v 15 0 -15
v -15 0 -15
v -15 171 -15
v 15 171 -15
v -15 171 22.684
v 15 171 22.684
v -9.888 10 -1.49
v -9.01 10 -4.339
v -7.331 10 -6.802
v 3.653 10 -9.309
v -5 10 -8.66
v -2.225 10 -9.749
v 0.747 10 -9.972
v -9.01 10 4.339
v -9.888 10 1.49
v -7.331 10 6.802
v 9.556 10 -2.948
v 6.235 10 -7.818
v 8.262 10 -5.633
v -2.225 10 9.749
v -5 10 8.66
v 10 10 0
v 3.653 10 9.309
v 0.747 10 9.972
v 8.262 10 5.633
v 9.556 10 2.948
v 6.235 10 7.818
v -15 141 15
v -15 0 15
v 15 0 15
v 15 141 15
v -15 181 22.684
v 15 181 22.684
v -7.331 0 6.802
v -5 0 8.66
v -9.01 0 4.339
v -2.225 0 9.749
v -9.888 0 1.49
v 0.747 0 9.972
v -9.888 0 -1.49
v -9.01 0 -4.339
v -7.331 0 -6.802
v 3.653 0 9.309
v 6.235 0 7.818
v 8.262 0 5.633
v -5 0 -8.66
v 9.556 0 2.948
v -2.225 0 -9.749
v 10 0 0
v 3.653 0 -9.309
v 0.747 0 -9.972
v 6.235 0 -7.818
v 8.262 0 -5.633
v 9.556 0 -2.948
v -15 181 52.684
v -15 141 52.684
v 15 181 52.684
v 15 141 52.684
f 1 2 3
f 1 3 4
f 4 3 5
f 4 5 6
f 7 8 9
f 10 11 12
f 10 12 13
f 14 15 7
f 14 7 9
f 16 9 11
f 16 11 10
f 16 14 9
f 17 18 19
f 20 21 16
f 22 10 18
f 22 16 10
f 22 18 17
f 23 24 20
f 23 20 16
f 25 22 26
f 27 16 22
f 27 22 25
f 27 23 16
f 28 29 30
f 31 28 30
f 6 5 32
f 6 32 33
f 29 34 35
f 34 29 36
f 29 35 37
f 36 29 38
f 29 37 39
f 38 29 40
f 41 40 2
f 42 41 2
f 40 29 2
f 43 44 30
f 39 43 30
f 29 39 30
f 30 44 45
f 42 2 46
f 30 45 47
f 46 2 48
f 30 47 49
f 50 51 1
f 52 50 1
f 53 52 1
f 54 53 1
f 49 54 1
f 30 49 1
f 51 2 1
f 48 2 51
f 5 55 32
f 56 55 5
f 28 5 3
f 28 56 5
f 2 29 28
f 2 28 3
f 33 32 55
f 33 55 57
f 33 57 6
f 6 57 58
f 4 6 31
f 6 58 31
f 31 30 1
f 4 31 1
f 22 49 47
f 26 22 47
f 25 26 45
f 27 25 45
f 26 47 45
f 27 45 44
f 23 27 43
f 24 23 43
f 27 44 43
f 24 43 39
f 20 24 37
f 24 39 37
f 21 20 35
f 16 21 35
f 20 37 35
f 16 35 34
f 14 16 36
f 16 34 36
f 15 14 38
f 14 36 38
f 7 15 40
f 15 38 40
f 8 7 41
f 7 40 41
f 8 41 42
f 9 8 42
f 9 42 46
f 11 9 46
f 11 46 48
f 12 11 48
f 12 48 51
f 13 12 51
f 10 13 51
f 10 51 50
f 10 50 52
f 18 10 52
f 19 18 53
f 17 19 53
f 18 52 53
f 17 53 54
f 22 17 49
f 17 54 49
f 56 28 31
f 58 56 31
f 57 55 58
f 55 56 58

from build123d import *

# Parameters (mm, degrees)
SKETCH1_W           = 30
SKETCH1_H           = 30
BOSS_EXTRUDE1_DEPTH = 171
SKETCH2_R           = 10
CUT_EXTRUDE1_DEPTH  = 10
SKETCH3_W           = 30
SKETCH3_H           = 30
BOSS_EXTRUDE2_DEPTH = 37.6839
SKETCH5_W           = 30
SKETCH5_H           = 30
BOSS_EXTRUDE3_DEPTH = 10


with BuildPart() as part:
    # Sketch1 → Boss-Extrude1 (new body)
    with BuildSketch(Plane(origin=(0, 0, 0), x_dir=(1, 0, 0), z_dir=(0, 1, 0))):
        Rectangle(SKETCH1_W, SKETCH1_H)
    extrude(amount=BOSS_EXTRUDE1_DEPTH)

    # Sketch2 → Cut-Extrude1 (cut)
    with BuildSketch(Plane.XZ):
        Circle(SKETCH2_R)
    extrude(amount=-CUT_EXTRUDE1_DEPTH, mode=Mode.SUBTRACT)

    # Sketch3 → Boss-Extrude2 (add)
    with BuildSketch(Plane.XY.offset(15)):
        with Locations((0, 156)):
            Rectangle(SKETCH3_W, SKETCH3_H)
    extrude(amount=BOSS_EXTRUDE2_DEPTH)

    # Sketch5 → Boss-Extrude3 (add)
    with BuildSketch(Plane(origin=(0, 171, 0), x_dir=(1, 0, 0), z_dir=(0, 1, 0))):
        with Locations((0, -37.6839)):
            Rectangle(SKETCH5_W, SKETCH5_H)
    extrude(amount=BOSS_EXTRUDE3_DEPTH)


solid = part.part
